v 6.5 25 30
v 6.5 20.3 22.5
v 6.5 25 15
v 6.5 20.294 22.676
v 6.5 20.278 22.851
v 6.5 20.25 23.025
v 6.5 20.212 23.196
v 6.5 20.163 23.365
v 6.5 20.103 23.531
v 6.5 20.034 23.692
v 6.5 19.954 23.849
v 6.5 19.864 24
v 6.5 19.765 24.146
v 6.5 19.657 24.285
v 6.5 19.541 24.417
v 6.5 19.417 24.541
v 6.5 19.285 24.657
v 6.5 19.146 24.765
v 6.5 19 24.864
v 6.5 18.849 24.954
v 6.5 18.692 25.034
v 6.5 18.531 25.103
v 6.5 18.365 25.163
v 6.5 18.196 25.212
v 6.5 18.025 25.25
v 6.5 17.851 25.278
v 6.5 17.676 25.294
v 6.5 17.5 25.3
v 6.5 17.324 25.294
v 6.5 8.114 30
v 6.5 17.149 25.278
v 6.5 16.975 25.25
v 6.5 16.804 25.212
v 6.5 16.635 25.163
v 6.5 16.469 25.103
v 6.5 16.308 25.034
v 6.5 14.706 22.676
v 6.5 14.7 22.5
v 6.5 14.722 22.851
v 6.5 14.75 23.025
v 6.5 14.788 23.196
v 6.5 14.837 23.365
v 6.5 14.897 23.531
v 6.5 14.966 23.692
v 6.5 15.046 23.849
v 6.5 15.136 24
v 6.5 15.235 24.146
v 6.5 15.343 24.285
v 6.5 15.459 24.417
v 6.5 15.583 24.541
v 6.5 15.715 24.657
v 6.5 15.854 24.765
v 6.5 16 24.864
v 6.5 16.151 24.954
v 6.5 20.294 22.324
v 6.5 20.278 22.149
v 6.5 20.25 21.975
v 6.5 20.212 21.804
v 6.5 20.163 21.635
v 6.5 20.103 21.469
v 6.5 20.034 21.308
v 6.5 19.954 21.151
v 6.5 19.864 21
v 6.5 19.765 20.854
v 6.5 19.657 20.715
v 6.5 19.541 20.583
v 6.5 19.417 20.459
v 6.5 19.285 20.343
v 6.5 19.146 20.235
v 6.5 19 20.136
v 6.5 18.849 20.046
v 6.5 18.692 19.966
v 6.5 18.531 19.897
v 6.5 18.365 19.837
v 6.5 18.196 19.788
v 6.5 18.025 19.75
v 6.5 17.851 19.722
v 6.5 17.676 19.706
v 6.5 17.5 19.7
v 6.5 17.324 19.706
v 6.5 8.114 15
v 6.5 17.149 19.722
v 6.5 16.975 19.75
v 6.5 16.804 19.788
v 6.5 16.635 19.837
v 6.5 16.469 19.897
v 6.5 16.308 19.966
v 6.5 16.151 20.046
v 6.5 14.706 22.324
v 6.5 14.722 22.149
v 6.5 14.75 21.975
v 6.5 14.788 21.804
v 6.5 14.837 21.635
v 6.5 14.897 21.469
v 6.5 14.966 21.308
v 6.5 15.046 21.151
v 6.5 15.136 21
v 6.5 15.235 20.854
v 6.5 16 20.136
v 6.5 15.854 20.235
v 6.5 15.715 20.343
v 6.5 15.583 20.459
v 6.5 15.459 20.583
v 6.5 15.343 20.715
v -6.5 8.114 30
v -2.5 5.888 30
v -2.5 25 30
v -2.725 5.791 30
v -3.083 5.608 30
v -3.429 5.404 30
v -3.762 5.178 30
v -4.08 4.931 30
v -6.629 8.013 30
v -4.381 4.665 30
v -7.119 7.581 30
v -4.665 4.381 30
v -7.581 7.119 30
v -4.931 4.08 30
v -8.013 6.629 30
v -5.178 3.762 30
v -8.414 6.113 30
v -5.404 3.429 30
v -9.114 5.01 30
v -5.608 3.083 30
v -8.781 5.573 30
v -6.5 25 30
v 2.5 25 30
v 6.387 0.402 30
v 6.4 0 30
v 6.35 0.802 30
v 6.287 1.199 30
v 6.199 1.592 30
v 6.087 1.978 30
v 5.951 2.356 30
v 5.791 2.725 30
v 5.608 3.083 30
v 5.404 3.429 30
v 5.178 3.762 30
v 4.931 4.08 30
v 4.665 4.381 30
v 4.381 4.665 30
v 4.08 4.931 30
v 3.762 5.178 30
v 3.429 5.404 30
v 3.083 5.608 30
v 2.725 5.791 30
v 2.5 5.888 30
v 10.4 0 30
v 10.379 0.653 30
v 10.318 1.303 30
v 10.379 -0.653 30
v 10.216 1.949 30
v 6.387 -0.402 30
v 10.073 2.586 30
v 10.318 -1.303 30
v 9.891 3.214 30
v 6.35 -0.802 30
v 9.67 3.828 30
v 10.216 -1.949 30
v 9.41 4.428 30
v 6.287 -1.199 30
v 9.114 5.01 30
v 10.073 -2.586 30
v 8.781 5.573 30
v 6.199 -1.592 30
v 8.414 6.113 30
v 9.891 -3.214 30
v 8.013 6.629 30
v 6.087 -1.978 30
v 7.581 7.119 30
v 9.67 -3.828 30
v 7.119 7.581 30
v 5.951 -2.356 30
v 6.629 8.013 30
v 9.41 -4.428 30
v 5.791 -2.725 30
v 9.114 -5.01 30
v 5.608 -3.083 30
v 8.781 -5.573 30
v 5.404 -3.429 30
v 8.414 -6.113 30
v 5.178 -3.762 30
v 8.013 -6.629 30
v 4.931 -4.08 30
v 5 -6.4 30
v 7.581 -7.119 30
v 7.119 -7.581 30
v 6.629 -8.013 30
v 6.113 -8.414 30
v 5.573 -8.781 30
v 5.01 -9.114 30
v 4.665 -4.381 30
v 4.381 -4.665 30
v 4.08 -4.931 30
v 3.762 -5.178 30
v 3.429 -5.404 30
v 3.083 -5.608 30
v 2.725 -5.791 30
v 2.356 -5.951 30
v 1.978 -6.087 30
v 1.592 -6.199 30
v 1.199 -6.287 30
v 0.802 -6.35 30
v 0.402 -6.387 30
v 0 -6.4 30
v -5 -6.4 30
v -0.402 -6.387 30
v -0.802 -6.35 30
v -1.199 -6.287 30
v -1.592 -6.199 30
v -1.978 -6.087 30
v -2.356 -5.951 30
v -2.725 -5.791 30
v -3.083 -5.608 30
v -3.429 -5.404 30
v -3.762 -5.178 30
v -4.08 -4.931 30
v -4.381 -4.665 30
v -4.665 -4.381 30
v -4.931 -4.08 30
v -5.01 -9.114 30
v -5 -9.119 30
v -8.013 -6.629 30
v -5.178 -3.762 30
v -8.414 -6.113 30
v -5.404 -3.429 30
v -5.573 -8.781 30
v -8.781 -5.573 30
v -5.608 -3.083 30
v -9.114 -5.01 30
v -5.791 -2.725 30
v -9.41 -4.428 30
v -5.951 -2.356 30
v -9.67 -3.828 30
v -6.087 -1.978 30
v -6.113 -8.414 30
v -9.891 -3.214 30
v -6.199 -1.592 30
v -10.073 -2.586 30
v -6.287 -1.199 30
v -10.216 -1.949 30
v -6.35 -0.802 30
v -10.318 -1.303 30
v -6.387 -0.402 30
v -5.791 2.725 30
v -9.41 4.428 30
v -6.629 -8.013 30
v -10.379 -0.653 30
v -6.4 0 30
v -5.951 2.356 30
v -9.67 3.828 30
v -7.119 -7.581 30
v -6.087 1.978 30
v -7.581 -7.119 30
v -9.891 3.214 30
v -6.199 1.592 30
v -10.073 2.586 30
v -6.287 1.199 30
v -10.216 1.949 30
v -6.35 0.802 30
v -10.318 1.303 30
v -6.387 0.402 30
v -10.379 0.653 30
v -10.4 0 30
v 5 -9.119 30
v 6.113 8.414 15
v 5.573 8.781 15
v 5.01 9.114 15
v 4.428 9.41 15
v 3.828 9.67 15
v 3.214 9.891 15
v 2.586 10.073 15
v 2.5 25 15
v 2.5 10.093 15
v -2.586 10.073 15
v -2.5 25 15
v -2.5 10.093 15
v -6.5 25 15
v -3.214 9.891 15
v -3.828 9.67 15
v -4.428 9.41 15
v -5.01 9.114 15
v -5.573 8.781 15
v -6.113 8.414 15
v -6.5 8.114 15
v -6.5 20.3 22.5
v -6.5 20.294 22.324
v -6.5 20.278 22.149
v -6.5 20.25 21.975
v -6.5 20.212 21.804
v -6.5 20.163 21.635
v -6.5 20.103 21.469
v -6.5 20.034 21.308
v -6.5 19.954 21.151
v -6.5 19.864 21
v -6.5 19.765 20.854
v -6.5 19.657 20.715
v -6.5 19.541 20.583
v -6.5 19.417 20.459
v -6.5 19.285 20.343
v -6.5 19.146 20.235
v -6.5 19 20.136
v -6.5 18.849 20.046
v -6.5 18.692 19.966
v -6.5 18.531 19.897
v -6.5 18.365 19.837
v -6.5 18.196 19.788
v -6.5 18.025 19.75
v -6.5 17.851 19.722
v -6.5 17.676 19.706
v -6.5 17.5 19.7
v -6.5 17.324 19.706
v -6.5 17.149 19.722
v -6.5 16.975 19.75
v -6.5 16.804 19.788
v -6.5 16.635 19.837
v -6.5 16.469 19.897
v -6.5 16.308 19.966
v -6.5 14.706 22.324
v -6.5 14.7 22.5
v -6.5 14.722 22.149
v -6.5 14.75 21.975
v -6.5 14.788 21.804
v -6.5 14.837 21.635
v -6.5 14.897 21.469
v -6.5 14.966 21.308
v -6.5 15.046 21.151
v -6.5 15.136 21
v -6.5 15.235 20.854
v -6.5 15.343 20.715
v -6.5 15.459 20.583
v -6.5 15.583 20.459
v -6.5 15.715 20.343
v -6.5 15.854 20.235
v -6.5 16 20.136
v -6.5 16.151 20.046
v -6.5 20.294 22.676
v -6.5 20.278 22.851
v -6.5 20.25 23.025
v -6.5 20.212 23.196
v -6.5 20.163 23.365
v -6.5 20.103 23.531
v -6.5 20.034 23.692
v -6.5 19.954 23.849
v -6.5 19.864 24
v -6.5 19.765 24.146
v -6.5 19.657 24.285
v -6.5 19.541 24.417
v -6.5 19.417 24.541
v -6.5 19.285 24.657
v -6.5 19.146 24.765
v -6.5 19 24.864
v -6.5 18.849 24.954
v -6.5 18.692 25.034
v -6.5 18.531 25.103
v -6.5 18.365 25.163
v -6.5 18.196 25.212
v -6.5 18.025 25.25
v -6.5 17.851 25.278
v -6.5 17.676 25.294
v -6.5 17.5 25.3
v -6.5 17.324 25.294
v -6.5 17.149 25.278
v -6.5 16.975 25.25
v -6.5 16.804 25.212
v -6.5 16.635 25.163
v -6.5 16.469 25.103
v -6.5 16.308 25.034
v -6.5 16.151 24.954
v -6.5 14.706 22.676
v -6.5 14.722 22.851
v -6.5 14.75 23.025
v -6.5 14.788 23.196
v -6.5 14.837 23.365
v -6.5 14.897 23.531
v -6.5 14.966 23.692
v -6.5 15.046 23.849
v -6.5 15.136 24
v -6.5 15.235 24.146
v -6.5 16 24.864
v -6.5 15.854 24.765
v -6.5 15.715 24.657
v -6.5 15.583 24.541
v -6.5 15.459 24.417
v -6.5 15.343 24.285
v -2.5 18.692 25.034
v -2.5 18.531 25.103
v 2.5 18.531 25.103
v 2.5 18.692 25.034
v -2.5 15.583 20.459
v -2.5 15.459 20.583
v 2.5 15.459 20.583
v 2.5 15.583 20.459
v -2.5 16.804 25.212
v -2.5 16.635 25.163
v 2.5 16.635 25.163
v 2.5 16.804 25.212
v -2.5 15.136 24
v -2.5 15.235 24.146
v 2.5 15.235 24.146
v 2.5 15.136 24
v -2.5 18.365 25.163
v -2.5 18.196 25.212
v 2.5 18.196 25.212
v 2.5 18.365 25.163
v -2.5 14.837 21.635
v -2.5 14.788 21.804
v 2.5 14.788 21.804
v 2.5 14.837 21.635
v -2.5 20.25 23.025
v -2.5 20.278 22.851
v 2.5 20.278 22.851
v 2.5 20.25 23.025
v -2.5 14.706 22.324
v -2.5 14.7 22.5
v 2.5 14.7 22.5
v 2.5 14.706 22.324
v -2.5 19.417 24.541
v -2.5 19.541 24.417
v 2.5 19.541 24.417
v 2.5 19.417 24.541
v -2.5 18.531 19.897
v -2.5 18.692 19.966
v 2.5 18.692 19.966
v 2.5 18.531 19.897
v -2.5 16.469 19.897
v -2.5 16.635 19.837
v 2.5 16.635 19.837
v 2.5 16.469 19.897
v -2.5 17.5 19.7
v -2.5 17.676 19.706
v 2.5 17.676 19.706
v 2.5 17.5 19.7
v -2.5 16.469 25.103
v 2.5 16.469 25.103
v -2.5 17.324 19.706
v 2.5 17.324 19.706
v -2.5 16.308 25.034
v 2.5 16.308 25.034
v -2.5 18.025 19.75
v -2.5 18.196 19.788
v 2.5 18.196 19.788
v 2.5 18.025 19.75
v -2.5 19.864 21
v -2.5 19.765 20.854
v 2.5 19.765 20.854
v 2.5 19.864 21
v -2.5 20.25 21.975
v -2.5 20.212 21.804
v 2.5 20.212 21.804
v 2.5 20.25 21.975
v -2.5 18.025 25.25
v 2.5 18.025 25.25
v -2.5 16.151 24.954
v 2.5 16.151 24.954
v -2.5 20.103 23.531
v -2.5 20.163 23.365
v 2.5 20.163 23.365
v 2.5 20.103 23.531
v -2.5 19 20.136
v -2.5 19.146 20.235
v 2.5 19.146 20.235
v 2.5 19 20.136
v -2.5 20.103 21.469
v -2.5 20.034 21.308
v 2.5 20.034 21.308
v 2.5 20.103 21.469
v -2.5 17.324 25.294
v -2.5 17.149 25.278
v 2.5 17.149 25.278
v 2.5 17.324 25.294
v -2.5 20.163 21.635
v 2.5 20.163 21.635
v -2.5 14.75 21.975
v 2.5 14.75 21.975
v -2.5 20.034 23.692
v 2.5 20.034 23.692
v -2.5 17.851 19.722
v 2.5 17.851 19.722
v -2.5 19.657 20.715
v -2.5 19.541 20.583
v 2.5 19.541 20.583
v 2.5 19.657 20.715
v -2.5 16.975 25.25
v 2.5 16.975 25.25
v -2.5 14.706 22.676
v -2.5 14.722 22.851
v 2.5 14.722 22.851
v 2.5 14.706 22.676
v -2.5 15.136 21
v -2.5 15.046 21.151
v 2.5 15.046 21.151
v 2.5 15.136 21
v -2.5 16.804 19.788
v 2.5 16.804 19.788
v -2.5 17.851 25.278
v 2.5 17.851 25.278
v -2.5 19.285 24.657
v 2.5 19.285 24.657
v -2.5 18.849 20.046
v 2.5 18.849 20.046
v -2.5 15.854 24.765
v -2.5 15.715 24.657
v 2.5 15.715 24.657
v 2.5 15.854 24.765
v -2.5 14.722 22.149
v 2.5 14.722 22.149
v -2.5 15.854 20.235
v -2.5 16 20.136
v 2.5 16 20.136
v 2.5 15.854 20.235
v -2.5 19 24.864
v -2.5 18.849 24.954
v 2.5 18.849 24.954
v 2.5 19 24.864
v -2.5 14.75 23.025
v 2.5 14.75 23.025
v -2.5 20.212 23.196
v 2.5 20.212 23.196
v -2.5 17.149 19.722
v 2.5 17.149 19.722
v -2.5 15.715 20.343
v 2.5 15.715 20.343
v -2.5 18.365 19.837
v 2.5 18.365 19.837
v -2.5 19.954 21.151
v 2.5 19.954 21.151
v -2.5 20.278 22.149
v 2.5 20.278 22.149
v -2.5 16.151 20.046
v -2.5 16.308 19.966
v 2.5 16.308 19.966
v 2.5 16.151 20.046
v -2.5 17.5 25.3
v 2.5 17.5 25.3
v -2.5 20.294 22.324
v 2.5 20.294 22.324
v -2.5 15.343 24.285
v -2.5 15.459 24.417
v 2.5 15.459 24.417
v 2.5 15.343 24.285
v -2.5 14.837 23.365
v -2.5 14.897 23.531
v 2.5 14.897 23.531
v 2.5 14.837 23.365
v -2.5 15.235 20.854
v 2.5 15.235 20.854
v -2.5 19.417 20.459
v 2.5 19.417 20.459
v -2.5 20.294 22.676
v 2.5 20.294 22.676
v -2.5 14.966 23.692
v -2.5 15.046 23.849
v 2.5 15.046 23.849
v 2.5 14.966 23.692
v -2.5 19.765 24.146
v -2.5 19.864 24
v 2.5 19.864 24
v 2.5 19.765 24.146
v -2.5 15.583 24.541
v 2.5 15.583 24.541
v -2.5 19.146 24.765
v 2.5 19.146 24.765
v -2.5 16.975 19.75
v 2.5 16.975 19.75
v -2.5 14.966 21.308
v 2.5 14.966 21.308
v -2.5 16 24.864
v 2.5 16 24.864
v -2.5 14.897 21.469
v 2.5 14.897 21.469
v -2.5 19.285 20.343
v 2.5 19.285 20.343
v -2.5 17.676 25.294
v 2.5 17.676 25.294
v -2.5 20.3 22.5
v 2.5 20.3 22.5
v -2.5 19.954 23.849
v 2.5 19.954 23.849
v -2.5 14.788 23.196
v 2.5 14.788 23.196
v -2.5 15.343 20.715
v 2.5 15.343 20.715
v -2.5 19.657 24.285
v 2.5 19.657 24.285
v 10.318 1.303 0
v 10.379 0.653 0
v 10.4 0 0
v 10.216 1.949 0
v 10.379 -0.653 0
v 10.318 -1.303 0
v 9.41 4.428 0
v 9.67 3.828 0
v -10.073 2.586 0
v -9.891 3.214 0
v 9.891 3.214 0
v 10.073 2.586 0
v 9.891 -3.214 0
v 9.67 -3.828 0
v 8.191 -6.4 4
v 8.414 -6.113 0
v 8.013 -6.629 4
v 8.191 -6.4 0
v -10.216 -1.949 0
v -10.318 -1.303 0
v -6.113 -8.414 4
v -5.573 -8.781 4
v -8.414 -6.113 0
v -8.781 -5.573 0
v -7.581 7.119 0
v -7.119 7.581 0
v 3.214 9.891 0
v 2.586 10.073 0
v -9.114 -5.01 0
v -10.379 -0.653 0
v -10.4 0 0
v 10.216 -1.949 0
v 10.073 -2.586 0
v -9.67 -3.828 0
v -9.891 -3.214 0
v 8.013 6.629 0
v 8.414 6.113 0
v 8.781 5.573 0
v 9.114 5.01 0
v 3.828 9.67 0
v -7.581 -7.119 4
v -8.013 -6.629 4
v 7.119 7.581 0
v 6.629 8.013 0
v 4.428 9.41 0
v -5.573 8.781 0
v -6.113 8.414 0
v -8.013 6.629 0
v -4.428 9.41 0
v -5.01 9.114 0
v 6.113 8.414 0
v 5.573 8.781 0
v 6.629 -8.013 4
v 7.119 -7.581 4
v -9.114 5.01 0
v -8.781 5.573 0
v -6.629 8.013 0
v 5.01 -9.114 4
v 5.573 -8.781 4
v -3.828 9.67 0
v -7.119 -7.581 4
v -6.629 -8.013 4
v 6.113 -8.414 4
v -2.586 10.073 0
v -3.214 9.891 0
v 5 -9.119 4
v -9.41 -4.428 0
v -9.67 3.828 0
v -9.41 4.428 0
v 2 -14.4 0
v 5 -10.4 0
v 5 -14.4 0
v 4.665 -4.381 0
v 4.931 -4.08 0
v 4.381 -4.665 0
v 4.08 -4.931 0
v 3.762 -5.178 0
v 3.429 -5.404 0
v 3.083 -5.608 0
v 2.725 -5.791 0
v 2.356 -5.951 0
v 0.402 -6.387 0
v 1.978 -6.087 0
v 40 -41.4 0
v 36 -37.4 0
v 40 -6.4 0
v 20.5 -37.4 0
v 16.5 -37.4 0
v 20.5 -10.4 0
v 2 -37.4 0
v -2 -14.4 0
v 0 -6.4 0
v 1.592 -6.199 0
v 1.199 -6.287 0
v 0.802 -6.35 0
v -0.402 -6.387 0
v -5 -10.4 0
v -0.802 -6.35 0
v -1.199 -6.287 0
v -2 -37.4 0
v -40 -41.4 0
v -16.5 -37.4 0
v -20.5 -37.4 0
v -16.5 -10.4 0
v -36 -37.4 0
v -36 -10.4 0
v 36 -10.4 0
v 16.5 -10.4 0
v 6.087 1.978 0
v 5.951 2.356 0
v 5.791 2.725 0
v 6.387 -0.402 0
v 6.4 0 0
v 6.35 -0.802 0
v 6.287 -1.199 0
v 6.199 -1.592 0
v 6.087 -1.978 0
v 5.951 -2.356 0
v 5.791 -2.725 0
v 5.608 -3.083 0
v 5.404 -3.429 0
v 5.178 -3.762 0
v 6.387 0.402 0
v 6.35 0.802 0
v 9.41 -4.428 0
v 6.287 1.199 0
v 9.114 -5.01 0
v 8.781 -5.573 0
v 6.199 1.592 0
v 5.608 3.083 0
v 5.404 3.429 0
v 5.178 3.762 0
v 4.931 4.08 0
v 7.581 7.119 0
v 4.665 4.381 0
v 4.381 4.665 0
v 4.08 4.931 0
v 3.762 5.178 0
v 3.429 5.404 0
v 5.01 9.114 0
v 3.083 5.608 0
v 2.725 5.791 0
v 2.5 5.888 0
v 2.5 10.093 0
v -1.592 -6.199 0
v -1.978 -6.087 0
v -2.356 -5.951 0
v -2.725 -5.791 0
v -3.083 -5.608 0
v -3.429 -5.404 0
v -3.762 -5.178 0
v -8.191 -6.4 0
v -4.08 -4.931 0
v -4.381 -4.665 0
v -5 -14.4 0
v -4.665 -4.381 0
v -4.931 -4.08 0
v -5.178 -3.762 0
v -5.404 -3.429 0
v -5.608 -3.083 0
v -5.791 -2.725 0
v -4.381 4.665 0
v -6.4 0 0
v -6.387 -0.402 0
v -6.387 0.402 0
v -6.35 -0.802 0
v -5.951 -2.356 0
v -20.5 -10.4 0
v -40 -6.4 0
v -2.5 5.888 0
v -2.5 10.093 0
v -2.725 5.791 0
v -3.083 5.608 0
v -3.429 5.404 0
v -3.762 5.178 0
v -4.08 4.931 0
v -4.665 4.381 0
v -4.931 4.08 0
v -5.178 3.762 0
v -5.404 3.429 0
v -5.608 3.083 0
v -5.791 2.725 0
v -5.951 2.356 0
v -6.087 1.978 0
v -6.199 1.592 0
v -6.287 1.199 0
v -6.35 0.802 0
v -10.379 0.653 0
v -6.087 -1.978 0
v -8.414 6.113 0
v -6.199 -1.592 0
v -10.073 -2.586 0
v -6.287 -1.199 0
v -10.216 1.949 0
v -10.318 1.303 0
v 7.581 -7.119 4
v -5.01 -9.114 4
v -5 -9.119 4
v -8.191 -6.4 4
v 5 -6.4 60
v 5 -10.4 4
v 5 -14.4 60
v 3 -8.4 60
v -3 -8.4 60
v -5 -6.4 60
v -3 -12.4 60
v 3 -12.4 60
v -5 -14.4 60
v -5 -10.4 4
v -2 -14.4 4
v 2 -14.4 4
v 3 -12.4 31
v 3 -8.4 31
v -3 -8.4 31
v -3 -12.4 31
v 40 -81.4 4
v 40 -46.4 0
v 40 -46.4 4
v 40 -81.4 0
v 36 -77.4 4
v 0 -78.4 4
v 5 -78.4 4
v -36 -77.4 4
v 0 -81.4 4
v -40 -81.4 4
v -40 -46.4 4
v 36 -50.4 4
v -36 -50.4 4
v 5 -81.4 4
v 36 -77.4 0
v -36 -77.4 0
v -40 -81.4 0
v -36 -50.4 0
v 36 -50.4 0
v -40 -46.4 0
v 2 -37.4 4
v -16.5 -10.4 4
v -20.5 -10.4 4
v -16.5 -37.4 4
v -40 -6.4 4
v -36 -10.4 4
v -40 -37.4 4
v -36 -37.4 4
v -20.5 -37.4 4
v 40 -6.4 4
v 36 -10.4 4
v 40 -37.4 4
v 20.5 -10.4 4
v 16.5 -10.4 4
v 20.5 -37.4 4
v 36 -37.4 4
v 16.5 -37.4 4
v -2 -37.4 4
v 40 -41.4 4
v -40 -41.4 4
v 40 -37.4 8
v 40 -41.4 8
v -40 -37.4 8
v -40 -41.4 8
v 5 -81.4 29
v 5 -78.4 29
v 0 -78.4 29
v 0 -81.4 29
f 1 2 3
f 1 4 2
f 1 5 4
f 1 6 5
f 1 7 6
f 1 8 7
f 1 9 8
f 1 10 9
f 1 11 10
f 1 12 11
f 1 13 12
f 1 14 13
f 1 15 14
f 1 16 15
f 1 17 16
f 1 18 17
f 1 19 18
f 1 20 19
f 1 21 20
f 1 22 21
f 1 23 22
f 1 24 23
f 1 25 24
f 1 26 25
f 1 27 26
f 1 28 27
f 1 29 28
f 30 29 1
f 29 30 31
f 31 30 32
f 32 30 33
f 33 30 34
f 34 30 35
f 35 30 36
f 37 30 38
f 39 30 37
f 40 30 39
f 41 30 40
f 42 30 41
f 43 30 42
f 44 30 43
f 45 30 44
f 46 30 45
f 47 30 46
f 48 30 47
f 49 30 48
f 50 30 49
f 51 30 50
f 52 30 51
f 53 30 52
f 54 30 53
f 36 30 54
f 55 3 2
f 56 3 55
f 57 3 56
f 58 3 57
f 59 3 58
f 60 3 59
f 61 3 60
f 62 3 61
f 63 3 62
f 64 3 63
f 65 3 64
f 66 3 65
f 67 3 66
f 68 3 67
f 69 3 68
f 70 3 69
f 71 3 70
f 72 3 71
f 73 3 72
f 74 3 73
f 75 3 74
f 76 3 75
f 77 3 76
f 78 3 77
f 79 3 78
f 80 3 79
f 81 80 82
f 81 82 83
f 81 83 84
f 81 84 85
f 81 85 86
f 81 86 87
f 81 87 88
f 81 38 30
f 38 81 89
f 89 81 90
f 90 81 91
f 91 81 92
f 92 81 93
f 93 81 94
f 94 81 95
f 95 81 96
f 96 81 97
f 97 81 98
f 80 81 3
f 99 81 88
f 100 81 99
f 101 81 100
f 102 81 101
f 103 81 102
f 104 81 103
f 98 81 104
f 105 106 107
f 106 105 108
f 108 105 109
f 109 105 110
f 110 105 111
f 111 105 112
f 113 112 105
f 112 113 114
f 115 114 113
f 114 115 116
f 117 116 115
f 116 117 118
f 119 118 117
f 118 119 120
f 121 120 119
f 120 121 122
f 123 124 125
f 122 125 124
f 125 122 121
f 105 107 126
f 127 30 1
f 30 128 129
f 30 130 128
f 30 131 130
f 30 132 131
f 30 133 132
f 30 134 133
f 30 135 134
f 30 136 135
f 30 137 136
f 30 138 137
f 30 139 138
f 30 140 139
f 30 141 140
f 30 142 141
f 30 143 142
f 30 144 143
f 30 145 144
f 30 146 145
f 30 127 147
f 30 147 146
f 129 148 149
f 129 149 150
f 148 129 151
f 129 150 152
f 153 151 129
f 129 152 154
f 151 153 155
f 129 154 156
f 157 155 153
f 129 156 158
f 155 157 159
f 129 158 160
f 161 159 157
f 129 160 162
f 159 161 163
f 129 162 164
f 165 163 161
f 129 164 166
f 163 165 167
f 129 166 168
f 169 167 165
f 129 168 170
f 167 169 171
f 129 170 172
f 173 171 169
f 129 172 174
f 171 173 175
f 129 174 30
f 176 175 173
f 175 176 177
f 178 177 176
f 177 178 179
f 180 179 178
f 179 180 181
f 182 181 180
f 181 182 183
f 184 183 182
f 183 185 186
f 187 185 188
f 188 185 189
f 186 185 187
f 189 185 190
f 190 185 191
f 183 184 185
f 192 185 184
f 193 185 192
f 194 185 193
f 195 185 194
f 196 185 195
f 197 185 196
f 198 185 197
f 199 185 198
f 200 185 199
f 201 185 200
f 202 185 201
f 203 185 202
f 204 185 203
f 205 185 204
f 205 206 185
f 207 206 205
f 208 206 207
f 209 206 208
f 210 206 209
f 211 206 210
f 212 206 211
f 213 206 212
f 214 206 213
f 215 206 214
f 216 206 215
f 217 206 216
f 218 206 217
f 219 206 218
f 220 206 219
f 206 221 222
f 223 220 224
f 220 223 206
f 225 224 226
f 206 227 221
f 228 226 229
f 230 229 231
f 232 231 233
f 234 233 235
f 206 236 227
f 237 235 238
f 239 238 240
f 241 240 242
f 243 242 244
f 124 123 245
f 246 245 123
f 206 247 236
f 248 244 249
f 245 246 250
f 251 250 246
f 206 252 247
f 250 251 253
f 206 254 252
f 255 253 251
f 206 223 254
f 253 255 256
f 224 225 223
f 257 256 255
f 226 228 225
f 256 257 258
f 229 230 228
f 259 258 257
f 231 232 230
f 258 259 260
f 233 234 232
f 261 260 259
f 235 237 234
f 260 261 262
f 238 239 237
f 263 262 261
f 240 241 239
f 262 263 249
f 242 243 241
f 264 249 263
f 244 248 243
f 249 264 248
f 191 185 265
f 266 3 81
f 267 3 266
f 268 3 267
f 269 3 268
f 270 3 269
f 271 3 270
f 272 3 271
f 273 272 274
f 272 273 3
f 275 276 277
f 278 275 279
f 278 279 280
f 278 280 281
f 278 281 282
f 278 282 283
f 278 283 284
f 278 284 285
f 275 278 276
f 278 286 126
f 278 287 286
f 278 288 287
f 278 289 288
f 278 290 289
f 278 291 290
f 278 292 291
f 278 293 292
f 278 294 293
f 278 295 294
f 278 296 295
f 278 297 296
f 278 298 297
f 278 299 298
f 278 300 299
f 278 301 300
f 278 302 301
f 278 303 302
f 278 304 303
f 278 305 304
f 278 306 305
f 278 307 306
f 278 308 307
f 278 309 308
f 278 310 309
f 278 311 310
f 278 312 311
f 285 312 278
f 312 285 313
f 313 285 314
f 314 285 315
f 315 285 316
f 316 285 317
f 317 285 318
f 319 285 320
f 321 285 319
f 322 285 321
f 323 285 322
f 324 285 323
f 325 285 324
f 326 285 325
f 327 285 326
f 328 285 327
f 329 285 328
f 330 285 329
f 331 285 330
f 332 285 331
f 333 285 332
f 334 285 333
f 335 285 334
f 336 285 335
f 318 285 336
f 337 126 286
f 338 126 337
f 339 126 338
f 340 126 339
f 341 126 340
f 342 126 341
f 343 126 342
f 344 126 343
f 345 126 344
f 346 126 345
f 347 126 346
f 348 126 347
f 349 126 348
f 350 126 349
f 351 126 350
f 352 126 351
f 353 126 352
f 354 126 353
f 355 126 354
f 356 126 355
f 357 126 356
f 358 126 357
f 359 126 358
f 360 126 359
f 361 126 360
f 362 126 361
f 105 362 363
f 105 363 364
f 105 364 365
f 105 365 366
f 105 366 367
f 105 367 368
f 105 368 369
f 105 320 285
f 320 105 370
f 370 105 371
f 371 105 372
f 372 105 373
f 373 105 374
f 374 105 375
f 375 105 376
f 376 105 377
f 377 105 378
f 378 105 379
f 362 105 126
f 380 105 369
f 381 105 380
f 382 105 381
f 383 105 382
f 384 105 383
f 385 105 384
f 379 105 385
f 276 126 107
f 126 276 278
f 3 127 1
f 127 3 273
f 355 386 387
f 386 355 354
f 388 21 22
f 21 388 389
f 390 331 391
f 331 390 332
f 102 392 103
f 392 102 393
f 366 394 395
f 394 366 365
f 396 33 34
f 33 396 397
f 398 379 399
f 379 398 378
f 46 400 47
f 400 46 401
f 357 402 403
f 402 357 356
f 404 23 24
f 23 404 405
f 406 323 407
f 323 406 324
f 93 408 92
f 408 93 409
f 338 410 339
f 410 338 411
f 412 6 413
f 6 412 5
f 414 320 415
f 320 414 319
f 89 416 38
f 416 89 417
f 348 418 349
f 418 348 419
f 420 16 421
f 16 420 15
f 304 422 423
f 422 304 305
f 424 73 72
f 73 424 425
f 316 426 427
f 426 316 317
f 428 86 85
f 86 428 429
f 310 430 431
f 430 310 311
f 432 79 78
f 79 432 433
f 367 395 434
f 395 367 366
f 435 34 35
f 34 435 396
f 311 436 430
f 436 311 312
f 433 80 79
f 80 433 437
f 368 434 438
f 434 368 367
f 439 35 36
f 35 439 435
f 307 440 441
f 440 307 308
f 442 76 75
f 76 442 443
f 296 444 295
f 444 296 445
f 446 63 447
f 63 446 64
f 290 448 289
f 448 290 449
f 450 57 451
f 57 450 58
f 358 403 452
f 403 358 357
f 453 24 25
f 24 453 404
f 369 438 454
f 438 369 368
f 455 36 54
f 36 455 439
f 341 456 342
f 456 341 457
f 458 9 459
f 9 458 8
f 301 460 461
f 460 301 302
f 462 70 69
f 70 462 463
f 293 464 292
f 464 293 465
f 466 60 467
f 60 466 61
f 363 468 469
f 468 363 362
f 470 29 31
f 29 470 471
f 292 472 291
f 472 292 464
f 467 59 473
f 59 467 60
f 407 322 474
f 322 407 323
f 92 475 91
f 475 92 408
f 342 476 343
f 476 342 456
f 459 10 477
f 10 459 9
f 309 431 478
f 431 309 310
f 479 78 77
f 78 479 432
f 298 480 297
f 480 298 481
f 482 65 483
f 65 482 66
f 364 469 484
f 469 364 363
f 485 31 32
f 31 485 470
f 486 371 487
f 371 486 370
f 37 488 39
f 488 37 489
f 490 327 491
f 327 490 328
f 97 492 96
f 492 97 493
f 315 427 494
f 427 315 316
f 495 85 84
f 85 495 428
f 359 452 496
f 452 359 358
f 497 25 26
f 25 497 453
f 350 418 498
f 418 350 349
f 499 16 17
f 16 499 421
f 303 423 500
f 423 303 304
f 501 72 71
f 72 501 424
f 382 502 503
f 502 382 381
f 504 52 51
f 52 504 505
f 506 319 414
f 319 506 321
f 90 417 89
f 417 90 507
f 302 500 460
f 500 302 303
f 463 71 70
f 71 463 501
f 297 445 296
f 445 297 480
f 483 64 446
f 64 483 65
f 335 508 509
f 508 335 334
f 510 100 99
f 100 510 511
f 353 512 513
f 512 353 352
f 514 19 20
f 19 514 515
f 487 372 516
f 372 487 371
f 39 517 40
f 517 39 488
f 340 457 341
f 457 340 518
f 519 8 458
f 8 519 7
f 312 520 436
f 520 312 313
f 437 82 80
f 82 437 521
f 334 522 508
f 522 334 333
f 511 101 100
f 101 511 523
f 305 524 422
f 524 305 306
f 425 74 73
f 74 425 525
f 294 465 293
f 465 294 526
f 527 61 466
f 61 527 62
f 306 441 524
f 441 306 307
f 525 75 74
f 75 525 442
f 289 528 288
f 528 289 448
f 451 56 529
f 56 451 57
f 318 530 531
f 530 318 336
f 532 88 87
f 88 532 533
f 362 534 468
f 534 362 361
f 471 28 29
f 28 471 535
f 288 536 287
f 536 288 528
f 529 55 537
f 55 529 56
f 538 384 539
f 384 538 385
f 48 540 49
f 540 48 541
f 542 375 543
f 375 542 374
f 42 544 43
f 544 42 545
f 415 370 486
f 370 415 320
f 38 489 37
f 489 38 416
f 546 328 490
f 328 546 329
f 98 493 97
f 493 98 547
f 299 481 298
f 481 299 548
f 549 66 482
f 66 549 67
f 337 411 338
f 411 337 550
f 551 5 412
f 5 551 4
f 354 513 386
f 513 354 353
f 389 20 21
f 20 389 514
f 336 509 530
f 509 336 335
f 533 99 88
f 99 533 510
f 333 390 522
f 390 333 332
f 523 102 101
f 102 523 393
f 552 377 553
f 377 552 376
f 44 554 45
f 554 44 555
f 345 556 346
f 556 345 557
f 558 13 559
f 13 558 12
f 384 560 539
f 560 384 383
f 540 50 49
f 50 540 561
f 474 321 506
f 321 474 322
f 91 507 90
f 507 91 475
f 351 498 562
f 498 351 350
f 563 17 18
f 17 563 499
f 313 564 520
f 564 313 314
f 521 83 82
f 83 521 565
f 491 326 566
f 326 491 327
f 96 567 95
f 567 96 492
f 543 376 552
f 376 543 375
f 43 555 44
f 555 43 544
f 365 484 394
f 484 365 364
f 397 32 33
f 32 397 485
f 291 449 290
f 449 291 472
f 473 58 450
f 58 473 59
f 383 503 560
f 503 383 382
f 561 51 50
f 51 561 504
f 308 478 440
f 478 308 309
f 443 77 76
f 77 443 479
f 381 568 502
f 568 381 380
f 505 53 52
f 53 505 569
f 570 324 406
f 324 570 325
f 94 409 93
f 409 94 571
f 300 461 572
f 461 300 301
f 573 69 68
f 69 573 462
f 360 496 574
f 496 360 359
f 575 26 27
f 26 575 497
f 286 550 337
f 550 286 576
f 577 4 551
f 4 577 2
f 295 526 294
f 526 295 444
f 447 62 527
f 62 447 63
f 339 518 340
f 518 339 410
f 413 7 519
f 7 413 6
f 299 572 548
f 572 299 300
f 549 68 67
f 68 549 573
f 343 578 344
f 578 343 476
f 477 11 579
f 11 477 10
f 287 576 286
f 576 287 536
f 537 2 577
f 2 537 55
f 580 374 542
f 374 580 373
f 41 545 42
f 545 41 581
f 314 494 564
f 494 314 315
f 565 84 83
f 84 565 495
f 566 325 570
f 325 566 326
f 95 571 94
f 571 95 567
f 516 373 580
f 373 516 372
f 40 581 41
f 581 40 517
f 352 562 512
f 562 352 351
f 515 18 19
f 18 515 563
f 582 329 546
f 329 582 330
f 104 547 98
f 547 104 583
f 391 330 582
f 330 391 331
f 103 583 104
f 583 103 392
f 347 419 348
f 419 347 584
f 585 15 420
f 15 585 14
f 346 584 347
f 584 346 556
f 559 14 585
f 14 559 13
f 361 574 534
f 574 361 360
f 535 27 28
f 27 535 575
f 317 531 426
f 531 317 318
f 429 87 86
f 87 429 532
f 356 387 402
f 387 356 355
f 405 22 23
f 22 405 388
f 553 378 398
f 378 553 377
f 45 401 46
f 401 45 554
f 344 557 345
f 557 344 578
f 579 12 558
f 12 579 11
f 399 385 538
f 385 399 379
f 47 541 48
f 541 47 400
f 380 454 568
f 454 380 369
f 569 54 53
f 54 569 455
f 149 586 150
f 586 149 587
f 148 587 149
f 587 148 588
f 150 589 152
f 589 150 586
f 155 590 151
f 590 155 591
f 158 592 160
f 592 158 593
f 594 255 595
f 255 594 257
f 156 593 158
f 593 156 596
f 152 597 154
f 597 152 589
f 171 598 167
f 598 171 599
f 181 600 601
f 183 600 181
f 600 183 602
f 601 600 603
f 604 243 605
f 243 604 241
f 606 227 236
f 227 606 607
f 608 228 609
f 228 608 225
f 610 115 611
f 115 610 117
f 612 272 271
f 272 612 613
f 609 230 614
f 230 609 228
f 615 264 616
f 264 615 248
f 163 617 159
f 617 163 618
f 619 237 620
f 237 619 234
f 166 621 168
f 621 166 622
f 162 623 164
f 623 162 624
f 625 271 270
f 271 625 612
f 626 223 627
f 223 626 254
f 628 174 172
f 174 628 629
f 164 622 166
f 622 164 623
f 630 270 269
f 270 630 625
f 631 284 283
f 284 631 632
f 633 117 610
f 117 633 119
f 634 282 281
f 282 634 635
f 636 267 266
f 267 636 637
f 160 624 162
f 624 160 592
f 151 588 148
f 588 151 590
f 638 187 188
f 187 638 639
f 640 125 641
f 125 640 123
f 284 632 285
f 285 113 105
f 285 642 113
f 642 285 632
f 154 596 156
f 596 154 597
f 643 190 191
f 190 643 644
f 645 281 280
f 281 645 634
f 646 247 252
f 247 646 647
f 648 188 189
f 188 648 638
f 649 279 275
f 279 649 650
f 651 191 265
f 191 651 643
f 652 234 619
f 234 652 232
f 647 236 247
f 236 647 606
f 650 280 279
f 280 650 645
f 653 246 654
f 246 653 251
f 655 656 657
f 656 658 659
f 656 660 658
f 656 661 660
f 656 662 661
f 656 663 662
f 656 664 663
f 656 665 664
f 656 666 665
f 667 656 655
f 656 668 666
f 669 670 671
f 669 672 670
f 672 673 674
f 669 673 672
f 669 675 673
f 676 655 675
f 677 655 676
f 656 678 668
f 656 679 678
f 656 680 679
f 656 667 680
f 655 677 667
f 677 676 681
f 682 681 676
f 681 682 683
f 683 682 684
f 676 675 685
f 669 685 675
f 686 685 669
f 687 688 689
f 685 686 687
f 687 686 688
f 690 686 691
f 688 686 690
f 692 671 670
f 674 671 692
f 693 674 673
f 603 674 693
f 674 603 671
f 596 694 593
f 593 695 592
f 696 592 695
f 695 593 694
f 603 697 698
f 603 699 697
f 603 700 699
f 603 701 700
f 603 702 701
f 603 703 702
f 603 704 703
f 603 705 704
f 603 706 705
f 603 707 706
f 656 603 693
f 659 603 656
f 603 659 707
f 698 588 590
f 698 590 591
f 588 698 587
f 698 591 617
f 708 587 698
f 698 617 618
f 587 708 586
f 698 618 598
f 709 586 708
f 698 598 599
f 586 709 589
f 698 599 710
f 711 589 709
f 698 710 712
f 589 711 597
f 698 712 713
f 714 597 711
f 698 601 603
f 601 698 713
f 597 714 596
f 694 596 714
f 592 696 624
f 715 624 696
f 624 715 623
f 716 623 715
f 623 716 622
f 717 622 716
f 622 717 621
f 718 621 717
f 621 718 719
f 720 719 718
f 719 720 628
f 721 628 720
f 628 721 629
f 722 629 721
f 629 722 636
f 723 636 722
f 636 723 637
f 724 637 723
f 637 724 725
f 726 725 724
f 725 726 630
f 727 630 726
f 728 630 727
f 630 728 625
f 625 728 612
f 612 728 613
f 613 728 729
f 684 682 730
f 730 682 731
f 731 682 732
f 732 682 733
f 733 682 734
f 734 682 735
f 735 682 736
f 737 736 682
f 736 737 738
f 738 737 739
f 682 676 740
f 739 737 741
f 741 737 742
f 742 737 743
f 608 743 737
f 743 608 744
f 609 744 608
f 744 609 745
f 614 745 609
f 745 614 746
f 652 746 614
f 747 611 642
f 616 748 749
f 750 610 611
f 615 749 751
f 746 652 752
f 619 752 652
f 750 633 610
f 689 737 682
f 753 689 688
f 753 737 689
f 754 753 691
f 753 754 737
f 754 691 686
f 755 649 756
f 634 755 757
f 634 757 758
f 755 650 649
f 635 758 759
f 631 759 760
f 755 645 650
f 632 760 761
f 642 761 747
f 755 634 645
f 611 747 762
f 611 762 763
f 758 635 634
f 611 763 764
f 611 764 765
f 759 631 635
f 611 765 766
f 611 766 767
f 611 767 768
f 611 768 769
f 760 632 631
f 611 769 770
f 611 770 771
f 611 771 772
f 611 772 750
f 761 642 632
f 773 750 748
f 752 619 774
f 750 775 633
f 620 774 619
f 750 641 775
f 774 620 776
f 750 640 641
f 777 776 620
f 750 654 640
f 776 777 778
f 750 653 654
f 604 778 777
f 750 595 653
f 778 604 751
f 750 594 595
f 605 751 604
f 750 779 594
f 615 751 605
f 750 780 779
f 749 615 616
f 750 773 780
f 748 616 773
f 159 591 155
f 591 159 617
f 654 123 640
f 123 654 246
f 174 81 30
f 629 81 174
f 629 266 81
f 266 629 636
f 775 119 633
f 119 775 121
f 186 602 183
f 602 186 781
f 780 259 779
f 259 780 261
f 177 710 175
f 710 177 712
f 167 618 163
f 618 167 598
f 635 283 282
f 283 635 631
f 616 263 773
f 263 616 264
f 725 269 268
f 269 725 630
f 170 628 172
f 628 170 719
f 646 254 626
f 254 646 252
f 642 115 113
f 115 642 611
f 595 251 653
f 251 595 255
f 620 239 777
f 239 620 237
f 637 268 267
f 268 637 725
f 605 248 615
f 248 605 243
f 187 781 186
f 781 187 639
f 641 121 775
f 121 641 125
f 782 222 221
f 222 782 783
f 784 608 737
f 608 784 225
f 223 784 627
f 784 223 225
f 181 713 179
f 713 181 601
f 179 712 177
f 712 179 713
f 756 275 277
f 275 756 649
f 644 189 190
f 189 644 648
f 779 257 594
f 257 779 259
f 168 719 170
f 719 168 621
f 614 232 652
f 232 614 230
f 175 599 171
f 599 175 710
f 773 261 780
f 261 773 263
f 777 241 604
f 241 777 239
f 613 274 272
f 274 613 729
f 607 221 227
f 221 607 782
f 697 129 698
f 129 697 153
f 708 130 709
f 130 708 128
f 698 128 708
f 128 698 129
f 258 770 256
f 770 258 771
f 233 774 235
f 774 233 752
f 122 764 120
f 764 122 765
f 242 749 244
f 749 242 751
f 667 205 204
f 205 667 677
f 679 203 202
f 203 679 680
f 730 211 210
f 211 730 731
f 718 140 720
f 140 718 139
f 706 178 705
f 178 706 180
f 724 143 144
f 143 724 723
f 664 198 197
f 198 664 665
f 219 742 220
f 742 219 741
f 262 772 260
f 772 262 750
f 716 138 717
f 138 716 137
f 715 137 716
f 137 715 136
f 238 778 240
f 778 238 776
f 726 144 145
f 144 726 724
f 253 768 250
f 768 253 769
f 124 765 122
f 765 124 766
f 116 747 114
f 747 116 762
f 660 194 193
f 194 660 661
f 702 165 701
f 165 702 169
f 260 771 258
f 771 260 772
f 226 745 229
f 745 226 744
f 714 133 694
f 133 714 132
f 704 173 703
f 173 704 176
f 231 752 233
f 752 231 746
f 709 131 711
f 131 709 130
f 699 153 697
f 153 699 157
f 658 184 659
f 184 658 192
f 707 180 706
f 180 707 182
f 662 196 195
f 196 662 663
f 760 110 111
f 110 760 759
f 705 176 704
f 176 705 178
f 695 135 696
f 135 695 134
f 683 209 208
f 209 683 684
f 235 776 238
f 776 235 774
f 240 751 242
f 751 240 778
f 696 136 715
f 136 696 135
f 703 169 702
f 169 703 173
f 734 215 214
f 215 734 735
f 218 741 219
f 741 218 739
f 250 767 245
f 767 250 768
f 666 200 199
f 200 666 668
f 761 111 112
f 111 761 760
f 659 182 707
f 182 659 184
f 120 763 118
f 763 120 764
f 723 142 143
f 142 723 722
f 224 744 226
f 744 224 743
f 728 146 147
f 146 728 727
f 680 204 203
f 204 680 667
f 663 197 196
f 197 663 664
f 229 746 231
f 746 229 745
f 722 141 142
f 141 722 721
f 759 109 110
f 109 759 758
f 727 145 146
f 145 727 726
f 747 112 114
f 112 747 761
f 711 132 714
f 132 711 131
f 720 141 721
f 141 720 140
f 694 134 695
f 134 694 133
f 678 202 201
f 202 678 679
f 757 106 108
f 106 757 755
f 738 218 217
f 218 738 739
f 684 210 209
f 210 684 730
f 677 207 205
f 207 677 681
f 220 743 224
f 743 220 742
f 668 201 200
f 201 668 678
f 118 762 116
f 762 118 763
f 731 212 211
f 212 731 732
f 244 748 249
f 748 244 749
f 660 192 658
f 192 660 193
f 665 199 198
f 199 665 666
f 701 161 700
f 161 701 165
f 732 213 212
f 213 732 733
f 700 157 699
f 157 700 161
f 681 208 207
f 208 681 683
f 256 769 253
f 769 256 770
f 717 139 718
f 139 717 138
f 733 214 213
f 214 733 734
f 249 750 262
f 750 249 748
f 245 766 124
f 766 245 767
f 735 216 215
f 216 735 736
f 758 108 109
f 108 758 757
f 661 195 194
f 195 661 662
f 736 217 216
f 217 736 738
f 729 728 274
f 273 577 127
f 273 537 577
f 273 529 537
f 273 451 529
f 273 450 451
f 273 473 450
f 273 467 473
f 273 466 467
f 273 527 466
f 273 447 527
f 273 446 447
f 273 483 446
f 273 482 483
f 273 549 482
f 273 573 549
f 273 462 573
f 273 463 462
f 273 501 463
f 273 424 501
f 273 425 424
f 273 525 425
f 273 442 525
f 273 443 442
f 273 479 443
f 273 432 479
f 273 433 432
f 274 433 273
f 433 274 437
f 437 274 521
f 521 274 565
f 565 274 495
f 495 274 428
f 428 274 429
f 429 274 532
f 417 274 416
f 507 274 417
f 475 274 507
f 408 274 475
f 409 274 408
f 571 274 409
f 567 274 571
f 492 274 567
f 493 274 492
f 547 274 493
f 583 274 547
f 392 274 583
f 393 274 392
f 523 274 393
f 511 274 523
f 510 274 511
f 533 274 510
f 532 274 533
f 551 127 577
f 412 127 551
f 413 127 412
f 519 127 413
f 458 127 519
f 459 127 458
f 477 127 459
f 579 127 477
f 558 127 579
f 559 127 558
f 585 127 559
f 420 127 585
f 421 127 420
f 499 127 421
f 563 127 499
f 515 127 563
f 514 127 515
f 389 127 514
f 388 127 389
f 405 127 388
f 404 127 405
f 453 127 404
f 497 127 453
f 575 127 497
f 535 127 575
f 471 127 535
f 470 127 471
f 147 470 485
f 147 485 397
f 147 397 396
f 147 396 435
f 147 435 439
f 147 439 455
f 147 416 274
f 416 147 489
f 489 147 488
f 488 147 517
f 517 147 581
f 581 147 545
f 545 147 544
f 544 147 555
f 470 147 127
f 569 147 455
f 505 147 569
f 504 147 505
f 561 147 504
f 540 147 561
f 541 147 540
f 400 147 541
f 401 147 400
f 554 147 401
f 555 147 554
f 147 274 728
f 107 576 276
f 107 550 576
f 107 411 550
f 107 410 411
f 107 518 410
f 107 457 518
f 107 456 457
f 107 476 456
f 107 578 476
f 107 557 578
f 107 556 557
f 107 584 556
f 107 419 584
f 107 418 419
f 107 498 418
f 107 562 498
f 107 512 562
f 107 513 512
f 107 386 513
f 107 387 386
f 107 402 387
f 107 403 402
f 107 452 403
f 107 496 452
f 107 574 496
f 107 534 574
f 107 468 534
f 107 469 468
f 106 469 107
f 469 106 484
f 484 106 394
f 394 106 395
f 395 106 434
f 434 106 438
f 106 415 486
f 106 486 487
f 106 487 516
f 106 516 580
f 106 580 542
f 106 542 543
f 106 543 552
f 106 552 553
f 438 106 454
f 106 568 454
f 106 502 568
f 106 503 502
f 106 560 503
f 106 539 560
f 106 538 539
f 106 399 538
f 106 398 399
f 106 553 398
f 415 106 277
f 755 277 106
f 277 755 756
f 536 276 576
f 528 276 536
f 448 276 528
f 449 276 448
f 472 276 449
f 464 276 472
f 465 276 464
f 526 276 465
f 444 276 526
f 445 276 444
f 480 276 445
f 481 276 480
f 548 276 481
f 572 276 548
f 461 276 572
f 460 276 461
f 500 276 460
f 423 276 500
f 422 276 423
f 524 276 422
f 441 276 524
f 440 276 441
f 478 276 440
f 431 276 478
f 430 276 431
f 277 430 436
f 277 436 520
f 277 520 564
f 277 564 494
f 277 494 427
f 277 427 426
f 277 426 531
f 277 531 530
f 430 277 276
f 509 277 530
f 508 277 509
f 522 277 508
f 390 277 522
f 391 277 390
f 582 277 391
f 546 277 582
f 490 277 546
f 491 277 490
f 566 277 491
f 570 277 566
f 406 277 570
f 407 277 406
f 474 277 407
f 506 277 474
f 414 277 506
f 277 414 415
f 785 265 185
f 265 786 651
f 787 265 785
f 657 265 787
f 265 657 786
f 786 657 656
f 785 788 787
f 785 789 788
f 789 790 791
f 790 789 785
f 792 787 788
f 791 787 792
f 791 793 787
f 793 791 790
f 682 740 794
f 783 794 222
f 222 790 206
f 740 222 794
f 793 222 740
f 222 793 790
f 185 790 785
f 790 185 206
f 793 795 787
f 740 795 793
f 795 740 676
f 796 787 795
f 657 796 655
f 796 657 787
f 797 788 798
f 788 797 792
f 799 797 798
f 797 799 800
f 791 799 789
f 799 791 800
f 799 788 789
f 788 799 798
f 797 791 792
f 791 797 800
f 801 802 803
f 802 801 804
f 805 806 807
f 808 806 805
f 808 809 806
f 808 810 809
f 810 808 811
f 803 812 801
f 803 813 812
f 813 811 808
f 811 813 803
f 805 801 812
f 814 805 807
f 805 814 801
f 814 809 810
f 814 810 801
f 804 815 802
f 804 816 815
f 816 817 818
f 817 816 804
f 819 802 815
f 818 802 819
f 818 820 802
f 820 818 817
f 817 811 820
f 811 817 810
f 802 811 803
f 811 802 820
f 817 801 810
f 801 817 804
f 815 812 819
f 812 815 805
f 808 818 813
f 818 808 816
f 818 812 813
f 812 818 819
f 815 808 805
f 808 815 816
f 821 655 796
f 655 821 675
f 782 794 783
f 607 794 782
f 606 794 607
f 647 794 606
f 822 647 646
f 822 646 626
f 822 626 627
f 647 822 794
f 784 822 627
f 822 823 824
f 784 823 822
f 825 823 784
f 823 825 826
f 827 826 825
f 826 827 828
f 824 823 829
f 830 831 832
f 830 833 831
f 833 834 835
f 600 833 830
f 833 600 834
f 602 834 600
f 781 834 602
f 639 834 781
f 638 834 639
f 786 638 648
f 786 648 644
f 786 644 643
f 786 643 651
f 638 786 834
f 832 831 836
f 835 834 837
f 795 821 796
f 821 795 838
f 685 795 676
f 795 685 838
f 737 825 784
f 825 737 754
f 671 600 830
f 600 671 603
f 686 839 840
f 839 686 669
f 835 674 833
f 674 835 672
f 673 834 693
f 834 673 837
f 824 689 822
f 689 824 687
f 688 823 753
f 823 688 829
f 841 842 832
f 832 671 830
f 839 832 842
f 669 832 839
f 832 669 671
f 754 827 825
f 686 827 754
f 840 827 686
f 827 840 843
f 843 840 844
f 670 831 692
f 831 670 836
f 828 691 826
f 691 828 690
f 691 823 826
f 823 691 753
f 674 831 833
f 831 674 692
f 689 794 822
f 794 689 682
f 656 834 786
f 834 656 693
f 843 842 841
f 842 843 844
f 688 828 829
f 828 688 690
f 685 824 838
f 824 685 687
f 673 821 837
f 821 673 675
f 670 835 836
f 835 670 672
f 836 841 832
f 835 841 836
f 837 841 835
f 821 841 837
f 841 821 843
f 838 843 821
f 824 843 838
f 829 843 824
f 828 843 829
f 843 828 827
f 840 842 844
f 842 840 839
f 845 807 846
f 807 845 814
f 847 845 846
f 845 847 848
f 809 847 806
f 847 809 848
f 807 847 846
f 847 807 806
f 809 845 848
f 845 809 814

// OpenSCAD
cube_size = 30;
rod_diameter = 12.8;
tab_width = 4; 
gap_width = 5;
rod_height = 30;
wall_width = 4;

module rod_holder(){
    difference(){
    union(){
        difference(){
        translate([-tab_width - gap_width/2, 0, 15])
        cube([2 * tab_width + gap_width, 25, 15]);
            
        translate([-50, 25/2 + 5,15 + 15/2])
        rotate([0, 90, 0])
        cylinder(r=2.8, h = 100, $fn=100);
            
        }
        cylinder(r=rod_diameter/2 + wall_width, h=30, $fn=100);
    }
    cylinder(r=rod_diameter/2, h=31, $fn=100);
    translate([-2.5, 0, 0])
    cube([5, 30, rod_height]);
    }
}

rod_holder();



translate([-10/2, -4 - rod_diameter/2 - 4,0]){
difference(){
cube([10, wall_width*2, 60]);
translate([2, wall_width/2, 31])
cube([6, wall_width , 30]);
}
}
translate([-40,-35-rod_diameter/2 -40 ,0]){
    difference(){
        cube([80, 35, 4]);
        translate([4, 4,0])
        cube([80-2*4, 35-2*4, 4]);
    }
}




translate([-2, -rod_diameter/2 - 35, 0]){
cube([4, 35, 4]);
translate([74/4,0,0])
cube([4, 35, 4]);
translate([-74/4,0,0])
cube([4, 35, 4]);
}

translate([-40,-35-rod_diameter/2,0])
cube([80, 4, 8]);

// top piece
translate([-40,-35-rod_diameter/2, 0]){
    difference(){
        cube([80, 35, 4]);
        translate([4, 4,0])
        cube([80-2*4, 35-2*4, 4]);
    }
}
translate([0,-35-rod_diameter/2 -40,0])
cube([5, 3, 29]);
